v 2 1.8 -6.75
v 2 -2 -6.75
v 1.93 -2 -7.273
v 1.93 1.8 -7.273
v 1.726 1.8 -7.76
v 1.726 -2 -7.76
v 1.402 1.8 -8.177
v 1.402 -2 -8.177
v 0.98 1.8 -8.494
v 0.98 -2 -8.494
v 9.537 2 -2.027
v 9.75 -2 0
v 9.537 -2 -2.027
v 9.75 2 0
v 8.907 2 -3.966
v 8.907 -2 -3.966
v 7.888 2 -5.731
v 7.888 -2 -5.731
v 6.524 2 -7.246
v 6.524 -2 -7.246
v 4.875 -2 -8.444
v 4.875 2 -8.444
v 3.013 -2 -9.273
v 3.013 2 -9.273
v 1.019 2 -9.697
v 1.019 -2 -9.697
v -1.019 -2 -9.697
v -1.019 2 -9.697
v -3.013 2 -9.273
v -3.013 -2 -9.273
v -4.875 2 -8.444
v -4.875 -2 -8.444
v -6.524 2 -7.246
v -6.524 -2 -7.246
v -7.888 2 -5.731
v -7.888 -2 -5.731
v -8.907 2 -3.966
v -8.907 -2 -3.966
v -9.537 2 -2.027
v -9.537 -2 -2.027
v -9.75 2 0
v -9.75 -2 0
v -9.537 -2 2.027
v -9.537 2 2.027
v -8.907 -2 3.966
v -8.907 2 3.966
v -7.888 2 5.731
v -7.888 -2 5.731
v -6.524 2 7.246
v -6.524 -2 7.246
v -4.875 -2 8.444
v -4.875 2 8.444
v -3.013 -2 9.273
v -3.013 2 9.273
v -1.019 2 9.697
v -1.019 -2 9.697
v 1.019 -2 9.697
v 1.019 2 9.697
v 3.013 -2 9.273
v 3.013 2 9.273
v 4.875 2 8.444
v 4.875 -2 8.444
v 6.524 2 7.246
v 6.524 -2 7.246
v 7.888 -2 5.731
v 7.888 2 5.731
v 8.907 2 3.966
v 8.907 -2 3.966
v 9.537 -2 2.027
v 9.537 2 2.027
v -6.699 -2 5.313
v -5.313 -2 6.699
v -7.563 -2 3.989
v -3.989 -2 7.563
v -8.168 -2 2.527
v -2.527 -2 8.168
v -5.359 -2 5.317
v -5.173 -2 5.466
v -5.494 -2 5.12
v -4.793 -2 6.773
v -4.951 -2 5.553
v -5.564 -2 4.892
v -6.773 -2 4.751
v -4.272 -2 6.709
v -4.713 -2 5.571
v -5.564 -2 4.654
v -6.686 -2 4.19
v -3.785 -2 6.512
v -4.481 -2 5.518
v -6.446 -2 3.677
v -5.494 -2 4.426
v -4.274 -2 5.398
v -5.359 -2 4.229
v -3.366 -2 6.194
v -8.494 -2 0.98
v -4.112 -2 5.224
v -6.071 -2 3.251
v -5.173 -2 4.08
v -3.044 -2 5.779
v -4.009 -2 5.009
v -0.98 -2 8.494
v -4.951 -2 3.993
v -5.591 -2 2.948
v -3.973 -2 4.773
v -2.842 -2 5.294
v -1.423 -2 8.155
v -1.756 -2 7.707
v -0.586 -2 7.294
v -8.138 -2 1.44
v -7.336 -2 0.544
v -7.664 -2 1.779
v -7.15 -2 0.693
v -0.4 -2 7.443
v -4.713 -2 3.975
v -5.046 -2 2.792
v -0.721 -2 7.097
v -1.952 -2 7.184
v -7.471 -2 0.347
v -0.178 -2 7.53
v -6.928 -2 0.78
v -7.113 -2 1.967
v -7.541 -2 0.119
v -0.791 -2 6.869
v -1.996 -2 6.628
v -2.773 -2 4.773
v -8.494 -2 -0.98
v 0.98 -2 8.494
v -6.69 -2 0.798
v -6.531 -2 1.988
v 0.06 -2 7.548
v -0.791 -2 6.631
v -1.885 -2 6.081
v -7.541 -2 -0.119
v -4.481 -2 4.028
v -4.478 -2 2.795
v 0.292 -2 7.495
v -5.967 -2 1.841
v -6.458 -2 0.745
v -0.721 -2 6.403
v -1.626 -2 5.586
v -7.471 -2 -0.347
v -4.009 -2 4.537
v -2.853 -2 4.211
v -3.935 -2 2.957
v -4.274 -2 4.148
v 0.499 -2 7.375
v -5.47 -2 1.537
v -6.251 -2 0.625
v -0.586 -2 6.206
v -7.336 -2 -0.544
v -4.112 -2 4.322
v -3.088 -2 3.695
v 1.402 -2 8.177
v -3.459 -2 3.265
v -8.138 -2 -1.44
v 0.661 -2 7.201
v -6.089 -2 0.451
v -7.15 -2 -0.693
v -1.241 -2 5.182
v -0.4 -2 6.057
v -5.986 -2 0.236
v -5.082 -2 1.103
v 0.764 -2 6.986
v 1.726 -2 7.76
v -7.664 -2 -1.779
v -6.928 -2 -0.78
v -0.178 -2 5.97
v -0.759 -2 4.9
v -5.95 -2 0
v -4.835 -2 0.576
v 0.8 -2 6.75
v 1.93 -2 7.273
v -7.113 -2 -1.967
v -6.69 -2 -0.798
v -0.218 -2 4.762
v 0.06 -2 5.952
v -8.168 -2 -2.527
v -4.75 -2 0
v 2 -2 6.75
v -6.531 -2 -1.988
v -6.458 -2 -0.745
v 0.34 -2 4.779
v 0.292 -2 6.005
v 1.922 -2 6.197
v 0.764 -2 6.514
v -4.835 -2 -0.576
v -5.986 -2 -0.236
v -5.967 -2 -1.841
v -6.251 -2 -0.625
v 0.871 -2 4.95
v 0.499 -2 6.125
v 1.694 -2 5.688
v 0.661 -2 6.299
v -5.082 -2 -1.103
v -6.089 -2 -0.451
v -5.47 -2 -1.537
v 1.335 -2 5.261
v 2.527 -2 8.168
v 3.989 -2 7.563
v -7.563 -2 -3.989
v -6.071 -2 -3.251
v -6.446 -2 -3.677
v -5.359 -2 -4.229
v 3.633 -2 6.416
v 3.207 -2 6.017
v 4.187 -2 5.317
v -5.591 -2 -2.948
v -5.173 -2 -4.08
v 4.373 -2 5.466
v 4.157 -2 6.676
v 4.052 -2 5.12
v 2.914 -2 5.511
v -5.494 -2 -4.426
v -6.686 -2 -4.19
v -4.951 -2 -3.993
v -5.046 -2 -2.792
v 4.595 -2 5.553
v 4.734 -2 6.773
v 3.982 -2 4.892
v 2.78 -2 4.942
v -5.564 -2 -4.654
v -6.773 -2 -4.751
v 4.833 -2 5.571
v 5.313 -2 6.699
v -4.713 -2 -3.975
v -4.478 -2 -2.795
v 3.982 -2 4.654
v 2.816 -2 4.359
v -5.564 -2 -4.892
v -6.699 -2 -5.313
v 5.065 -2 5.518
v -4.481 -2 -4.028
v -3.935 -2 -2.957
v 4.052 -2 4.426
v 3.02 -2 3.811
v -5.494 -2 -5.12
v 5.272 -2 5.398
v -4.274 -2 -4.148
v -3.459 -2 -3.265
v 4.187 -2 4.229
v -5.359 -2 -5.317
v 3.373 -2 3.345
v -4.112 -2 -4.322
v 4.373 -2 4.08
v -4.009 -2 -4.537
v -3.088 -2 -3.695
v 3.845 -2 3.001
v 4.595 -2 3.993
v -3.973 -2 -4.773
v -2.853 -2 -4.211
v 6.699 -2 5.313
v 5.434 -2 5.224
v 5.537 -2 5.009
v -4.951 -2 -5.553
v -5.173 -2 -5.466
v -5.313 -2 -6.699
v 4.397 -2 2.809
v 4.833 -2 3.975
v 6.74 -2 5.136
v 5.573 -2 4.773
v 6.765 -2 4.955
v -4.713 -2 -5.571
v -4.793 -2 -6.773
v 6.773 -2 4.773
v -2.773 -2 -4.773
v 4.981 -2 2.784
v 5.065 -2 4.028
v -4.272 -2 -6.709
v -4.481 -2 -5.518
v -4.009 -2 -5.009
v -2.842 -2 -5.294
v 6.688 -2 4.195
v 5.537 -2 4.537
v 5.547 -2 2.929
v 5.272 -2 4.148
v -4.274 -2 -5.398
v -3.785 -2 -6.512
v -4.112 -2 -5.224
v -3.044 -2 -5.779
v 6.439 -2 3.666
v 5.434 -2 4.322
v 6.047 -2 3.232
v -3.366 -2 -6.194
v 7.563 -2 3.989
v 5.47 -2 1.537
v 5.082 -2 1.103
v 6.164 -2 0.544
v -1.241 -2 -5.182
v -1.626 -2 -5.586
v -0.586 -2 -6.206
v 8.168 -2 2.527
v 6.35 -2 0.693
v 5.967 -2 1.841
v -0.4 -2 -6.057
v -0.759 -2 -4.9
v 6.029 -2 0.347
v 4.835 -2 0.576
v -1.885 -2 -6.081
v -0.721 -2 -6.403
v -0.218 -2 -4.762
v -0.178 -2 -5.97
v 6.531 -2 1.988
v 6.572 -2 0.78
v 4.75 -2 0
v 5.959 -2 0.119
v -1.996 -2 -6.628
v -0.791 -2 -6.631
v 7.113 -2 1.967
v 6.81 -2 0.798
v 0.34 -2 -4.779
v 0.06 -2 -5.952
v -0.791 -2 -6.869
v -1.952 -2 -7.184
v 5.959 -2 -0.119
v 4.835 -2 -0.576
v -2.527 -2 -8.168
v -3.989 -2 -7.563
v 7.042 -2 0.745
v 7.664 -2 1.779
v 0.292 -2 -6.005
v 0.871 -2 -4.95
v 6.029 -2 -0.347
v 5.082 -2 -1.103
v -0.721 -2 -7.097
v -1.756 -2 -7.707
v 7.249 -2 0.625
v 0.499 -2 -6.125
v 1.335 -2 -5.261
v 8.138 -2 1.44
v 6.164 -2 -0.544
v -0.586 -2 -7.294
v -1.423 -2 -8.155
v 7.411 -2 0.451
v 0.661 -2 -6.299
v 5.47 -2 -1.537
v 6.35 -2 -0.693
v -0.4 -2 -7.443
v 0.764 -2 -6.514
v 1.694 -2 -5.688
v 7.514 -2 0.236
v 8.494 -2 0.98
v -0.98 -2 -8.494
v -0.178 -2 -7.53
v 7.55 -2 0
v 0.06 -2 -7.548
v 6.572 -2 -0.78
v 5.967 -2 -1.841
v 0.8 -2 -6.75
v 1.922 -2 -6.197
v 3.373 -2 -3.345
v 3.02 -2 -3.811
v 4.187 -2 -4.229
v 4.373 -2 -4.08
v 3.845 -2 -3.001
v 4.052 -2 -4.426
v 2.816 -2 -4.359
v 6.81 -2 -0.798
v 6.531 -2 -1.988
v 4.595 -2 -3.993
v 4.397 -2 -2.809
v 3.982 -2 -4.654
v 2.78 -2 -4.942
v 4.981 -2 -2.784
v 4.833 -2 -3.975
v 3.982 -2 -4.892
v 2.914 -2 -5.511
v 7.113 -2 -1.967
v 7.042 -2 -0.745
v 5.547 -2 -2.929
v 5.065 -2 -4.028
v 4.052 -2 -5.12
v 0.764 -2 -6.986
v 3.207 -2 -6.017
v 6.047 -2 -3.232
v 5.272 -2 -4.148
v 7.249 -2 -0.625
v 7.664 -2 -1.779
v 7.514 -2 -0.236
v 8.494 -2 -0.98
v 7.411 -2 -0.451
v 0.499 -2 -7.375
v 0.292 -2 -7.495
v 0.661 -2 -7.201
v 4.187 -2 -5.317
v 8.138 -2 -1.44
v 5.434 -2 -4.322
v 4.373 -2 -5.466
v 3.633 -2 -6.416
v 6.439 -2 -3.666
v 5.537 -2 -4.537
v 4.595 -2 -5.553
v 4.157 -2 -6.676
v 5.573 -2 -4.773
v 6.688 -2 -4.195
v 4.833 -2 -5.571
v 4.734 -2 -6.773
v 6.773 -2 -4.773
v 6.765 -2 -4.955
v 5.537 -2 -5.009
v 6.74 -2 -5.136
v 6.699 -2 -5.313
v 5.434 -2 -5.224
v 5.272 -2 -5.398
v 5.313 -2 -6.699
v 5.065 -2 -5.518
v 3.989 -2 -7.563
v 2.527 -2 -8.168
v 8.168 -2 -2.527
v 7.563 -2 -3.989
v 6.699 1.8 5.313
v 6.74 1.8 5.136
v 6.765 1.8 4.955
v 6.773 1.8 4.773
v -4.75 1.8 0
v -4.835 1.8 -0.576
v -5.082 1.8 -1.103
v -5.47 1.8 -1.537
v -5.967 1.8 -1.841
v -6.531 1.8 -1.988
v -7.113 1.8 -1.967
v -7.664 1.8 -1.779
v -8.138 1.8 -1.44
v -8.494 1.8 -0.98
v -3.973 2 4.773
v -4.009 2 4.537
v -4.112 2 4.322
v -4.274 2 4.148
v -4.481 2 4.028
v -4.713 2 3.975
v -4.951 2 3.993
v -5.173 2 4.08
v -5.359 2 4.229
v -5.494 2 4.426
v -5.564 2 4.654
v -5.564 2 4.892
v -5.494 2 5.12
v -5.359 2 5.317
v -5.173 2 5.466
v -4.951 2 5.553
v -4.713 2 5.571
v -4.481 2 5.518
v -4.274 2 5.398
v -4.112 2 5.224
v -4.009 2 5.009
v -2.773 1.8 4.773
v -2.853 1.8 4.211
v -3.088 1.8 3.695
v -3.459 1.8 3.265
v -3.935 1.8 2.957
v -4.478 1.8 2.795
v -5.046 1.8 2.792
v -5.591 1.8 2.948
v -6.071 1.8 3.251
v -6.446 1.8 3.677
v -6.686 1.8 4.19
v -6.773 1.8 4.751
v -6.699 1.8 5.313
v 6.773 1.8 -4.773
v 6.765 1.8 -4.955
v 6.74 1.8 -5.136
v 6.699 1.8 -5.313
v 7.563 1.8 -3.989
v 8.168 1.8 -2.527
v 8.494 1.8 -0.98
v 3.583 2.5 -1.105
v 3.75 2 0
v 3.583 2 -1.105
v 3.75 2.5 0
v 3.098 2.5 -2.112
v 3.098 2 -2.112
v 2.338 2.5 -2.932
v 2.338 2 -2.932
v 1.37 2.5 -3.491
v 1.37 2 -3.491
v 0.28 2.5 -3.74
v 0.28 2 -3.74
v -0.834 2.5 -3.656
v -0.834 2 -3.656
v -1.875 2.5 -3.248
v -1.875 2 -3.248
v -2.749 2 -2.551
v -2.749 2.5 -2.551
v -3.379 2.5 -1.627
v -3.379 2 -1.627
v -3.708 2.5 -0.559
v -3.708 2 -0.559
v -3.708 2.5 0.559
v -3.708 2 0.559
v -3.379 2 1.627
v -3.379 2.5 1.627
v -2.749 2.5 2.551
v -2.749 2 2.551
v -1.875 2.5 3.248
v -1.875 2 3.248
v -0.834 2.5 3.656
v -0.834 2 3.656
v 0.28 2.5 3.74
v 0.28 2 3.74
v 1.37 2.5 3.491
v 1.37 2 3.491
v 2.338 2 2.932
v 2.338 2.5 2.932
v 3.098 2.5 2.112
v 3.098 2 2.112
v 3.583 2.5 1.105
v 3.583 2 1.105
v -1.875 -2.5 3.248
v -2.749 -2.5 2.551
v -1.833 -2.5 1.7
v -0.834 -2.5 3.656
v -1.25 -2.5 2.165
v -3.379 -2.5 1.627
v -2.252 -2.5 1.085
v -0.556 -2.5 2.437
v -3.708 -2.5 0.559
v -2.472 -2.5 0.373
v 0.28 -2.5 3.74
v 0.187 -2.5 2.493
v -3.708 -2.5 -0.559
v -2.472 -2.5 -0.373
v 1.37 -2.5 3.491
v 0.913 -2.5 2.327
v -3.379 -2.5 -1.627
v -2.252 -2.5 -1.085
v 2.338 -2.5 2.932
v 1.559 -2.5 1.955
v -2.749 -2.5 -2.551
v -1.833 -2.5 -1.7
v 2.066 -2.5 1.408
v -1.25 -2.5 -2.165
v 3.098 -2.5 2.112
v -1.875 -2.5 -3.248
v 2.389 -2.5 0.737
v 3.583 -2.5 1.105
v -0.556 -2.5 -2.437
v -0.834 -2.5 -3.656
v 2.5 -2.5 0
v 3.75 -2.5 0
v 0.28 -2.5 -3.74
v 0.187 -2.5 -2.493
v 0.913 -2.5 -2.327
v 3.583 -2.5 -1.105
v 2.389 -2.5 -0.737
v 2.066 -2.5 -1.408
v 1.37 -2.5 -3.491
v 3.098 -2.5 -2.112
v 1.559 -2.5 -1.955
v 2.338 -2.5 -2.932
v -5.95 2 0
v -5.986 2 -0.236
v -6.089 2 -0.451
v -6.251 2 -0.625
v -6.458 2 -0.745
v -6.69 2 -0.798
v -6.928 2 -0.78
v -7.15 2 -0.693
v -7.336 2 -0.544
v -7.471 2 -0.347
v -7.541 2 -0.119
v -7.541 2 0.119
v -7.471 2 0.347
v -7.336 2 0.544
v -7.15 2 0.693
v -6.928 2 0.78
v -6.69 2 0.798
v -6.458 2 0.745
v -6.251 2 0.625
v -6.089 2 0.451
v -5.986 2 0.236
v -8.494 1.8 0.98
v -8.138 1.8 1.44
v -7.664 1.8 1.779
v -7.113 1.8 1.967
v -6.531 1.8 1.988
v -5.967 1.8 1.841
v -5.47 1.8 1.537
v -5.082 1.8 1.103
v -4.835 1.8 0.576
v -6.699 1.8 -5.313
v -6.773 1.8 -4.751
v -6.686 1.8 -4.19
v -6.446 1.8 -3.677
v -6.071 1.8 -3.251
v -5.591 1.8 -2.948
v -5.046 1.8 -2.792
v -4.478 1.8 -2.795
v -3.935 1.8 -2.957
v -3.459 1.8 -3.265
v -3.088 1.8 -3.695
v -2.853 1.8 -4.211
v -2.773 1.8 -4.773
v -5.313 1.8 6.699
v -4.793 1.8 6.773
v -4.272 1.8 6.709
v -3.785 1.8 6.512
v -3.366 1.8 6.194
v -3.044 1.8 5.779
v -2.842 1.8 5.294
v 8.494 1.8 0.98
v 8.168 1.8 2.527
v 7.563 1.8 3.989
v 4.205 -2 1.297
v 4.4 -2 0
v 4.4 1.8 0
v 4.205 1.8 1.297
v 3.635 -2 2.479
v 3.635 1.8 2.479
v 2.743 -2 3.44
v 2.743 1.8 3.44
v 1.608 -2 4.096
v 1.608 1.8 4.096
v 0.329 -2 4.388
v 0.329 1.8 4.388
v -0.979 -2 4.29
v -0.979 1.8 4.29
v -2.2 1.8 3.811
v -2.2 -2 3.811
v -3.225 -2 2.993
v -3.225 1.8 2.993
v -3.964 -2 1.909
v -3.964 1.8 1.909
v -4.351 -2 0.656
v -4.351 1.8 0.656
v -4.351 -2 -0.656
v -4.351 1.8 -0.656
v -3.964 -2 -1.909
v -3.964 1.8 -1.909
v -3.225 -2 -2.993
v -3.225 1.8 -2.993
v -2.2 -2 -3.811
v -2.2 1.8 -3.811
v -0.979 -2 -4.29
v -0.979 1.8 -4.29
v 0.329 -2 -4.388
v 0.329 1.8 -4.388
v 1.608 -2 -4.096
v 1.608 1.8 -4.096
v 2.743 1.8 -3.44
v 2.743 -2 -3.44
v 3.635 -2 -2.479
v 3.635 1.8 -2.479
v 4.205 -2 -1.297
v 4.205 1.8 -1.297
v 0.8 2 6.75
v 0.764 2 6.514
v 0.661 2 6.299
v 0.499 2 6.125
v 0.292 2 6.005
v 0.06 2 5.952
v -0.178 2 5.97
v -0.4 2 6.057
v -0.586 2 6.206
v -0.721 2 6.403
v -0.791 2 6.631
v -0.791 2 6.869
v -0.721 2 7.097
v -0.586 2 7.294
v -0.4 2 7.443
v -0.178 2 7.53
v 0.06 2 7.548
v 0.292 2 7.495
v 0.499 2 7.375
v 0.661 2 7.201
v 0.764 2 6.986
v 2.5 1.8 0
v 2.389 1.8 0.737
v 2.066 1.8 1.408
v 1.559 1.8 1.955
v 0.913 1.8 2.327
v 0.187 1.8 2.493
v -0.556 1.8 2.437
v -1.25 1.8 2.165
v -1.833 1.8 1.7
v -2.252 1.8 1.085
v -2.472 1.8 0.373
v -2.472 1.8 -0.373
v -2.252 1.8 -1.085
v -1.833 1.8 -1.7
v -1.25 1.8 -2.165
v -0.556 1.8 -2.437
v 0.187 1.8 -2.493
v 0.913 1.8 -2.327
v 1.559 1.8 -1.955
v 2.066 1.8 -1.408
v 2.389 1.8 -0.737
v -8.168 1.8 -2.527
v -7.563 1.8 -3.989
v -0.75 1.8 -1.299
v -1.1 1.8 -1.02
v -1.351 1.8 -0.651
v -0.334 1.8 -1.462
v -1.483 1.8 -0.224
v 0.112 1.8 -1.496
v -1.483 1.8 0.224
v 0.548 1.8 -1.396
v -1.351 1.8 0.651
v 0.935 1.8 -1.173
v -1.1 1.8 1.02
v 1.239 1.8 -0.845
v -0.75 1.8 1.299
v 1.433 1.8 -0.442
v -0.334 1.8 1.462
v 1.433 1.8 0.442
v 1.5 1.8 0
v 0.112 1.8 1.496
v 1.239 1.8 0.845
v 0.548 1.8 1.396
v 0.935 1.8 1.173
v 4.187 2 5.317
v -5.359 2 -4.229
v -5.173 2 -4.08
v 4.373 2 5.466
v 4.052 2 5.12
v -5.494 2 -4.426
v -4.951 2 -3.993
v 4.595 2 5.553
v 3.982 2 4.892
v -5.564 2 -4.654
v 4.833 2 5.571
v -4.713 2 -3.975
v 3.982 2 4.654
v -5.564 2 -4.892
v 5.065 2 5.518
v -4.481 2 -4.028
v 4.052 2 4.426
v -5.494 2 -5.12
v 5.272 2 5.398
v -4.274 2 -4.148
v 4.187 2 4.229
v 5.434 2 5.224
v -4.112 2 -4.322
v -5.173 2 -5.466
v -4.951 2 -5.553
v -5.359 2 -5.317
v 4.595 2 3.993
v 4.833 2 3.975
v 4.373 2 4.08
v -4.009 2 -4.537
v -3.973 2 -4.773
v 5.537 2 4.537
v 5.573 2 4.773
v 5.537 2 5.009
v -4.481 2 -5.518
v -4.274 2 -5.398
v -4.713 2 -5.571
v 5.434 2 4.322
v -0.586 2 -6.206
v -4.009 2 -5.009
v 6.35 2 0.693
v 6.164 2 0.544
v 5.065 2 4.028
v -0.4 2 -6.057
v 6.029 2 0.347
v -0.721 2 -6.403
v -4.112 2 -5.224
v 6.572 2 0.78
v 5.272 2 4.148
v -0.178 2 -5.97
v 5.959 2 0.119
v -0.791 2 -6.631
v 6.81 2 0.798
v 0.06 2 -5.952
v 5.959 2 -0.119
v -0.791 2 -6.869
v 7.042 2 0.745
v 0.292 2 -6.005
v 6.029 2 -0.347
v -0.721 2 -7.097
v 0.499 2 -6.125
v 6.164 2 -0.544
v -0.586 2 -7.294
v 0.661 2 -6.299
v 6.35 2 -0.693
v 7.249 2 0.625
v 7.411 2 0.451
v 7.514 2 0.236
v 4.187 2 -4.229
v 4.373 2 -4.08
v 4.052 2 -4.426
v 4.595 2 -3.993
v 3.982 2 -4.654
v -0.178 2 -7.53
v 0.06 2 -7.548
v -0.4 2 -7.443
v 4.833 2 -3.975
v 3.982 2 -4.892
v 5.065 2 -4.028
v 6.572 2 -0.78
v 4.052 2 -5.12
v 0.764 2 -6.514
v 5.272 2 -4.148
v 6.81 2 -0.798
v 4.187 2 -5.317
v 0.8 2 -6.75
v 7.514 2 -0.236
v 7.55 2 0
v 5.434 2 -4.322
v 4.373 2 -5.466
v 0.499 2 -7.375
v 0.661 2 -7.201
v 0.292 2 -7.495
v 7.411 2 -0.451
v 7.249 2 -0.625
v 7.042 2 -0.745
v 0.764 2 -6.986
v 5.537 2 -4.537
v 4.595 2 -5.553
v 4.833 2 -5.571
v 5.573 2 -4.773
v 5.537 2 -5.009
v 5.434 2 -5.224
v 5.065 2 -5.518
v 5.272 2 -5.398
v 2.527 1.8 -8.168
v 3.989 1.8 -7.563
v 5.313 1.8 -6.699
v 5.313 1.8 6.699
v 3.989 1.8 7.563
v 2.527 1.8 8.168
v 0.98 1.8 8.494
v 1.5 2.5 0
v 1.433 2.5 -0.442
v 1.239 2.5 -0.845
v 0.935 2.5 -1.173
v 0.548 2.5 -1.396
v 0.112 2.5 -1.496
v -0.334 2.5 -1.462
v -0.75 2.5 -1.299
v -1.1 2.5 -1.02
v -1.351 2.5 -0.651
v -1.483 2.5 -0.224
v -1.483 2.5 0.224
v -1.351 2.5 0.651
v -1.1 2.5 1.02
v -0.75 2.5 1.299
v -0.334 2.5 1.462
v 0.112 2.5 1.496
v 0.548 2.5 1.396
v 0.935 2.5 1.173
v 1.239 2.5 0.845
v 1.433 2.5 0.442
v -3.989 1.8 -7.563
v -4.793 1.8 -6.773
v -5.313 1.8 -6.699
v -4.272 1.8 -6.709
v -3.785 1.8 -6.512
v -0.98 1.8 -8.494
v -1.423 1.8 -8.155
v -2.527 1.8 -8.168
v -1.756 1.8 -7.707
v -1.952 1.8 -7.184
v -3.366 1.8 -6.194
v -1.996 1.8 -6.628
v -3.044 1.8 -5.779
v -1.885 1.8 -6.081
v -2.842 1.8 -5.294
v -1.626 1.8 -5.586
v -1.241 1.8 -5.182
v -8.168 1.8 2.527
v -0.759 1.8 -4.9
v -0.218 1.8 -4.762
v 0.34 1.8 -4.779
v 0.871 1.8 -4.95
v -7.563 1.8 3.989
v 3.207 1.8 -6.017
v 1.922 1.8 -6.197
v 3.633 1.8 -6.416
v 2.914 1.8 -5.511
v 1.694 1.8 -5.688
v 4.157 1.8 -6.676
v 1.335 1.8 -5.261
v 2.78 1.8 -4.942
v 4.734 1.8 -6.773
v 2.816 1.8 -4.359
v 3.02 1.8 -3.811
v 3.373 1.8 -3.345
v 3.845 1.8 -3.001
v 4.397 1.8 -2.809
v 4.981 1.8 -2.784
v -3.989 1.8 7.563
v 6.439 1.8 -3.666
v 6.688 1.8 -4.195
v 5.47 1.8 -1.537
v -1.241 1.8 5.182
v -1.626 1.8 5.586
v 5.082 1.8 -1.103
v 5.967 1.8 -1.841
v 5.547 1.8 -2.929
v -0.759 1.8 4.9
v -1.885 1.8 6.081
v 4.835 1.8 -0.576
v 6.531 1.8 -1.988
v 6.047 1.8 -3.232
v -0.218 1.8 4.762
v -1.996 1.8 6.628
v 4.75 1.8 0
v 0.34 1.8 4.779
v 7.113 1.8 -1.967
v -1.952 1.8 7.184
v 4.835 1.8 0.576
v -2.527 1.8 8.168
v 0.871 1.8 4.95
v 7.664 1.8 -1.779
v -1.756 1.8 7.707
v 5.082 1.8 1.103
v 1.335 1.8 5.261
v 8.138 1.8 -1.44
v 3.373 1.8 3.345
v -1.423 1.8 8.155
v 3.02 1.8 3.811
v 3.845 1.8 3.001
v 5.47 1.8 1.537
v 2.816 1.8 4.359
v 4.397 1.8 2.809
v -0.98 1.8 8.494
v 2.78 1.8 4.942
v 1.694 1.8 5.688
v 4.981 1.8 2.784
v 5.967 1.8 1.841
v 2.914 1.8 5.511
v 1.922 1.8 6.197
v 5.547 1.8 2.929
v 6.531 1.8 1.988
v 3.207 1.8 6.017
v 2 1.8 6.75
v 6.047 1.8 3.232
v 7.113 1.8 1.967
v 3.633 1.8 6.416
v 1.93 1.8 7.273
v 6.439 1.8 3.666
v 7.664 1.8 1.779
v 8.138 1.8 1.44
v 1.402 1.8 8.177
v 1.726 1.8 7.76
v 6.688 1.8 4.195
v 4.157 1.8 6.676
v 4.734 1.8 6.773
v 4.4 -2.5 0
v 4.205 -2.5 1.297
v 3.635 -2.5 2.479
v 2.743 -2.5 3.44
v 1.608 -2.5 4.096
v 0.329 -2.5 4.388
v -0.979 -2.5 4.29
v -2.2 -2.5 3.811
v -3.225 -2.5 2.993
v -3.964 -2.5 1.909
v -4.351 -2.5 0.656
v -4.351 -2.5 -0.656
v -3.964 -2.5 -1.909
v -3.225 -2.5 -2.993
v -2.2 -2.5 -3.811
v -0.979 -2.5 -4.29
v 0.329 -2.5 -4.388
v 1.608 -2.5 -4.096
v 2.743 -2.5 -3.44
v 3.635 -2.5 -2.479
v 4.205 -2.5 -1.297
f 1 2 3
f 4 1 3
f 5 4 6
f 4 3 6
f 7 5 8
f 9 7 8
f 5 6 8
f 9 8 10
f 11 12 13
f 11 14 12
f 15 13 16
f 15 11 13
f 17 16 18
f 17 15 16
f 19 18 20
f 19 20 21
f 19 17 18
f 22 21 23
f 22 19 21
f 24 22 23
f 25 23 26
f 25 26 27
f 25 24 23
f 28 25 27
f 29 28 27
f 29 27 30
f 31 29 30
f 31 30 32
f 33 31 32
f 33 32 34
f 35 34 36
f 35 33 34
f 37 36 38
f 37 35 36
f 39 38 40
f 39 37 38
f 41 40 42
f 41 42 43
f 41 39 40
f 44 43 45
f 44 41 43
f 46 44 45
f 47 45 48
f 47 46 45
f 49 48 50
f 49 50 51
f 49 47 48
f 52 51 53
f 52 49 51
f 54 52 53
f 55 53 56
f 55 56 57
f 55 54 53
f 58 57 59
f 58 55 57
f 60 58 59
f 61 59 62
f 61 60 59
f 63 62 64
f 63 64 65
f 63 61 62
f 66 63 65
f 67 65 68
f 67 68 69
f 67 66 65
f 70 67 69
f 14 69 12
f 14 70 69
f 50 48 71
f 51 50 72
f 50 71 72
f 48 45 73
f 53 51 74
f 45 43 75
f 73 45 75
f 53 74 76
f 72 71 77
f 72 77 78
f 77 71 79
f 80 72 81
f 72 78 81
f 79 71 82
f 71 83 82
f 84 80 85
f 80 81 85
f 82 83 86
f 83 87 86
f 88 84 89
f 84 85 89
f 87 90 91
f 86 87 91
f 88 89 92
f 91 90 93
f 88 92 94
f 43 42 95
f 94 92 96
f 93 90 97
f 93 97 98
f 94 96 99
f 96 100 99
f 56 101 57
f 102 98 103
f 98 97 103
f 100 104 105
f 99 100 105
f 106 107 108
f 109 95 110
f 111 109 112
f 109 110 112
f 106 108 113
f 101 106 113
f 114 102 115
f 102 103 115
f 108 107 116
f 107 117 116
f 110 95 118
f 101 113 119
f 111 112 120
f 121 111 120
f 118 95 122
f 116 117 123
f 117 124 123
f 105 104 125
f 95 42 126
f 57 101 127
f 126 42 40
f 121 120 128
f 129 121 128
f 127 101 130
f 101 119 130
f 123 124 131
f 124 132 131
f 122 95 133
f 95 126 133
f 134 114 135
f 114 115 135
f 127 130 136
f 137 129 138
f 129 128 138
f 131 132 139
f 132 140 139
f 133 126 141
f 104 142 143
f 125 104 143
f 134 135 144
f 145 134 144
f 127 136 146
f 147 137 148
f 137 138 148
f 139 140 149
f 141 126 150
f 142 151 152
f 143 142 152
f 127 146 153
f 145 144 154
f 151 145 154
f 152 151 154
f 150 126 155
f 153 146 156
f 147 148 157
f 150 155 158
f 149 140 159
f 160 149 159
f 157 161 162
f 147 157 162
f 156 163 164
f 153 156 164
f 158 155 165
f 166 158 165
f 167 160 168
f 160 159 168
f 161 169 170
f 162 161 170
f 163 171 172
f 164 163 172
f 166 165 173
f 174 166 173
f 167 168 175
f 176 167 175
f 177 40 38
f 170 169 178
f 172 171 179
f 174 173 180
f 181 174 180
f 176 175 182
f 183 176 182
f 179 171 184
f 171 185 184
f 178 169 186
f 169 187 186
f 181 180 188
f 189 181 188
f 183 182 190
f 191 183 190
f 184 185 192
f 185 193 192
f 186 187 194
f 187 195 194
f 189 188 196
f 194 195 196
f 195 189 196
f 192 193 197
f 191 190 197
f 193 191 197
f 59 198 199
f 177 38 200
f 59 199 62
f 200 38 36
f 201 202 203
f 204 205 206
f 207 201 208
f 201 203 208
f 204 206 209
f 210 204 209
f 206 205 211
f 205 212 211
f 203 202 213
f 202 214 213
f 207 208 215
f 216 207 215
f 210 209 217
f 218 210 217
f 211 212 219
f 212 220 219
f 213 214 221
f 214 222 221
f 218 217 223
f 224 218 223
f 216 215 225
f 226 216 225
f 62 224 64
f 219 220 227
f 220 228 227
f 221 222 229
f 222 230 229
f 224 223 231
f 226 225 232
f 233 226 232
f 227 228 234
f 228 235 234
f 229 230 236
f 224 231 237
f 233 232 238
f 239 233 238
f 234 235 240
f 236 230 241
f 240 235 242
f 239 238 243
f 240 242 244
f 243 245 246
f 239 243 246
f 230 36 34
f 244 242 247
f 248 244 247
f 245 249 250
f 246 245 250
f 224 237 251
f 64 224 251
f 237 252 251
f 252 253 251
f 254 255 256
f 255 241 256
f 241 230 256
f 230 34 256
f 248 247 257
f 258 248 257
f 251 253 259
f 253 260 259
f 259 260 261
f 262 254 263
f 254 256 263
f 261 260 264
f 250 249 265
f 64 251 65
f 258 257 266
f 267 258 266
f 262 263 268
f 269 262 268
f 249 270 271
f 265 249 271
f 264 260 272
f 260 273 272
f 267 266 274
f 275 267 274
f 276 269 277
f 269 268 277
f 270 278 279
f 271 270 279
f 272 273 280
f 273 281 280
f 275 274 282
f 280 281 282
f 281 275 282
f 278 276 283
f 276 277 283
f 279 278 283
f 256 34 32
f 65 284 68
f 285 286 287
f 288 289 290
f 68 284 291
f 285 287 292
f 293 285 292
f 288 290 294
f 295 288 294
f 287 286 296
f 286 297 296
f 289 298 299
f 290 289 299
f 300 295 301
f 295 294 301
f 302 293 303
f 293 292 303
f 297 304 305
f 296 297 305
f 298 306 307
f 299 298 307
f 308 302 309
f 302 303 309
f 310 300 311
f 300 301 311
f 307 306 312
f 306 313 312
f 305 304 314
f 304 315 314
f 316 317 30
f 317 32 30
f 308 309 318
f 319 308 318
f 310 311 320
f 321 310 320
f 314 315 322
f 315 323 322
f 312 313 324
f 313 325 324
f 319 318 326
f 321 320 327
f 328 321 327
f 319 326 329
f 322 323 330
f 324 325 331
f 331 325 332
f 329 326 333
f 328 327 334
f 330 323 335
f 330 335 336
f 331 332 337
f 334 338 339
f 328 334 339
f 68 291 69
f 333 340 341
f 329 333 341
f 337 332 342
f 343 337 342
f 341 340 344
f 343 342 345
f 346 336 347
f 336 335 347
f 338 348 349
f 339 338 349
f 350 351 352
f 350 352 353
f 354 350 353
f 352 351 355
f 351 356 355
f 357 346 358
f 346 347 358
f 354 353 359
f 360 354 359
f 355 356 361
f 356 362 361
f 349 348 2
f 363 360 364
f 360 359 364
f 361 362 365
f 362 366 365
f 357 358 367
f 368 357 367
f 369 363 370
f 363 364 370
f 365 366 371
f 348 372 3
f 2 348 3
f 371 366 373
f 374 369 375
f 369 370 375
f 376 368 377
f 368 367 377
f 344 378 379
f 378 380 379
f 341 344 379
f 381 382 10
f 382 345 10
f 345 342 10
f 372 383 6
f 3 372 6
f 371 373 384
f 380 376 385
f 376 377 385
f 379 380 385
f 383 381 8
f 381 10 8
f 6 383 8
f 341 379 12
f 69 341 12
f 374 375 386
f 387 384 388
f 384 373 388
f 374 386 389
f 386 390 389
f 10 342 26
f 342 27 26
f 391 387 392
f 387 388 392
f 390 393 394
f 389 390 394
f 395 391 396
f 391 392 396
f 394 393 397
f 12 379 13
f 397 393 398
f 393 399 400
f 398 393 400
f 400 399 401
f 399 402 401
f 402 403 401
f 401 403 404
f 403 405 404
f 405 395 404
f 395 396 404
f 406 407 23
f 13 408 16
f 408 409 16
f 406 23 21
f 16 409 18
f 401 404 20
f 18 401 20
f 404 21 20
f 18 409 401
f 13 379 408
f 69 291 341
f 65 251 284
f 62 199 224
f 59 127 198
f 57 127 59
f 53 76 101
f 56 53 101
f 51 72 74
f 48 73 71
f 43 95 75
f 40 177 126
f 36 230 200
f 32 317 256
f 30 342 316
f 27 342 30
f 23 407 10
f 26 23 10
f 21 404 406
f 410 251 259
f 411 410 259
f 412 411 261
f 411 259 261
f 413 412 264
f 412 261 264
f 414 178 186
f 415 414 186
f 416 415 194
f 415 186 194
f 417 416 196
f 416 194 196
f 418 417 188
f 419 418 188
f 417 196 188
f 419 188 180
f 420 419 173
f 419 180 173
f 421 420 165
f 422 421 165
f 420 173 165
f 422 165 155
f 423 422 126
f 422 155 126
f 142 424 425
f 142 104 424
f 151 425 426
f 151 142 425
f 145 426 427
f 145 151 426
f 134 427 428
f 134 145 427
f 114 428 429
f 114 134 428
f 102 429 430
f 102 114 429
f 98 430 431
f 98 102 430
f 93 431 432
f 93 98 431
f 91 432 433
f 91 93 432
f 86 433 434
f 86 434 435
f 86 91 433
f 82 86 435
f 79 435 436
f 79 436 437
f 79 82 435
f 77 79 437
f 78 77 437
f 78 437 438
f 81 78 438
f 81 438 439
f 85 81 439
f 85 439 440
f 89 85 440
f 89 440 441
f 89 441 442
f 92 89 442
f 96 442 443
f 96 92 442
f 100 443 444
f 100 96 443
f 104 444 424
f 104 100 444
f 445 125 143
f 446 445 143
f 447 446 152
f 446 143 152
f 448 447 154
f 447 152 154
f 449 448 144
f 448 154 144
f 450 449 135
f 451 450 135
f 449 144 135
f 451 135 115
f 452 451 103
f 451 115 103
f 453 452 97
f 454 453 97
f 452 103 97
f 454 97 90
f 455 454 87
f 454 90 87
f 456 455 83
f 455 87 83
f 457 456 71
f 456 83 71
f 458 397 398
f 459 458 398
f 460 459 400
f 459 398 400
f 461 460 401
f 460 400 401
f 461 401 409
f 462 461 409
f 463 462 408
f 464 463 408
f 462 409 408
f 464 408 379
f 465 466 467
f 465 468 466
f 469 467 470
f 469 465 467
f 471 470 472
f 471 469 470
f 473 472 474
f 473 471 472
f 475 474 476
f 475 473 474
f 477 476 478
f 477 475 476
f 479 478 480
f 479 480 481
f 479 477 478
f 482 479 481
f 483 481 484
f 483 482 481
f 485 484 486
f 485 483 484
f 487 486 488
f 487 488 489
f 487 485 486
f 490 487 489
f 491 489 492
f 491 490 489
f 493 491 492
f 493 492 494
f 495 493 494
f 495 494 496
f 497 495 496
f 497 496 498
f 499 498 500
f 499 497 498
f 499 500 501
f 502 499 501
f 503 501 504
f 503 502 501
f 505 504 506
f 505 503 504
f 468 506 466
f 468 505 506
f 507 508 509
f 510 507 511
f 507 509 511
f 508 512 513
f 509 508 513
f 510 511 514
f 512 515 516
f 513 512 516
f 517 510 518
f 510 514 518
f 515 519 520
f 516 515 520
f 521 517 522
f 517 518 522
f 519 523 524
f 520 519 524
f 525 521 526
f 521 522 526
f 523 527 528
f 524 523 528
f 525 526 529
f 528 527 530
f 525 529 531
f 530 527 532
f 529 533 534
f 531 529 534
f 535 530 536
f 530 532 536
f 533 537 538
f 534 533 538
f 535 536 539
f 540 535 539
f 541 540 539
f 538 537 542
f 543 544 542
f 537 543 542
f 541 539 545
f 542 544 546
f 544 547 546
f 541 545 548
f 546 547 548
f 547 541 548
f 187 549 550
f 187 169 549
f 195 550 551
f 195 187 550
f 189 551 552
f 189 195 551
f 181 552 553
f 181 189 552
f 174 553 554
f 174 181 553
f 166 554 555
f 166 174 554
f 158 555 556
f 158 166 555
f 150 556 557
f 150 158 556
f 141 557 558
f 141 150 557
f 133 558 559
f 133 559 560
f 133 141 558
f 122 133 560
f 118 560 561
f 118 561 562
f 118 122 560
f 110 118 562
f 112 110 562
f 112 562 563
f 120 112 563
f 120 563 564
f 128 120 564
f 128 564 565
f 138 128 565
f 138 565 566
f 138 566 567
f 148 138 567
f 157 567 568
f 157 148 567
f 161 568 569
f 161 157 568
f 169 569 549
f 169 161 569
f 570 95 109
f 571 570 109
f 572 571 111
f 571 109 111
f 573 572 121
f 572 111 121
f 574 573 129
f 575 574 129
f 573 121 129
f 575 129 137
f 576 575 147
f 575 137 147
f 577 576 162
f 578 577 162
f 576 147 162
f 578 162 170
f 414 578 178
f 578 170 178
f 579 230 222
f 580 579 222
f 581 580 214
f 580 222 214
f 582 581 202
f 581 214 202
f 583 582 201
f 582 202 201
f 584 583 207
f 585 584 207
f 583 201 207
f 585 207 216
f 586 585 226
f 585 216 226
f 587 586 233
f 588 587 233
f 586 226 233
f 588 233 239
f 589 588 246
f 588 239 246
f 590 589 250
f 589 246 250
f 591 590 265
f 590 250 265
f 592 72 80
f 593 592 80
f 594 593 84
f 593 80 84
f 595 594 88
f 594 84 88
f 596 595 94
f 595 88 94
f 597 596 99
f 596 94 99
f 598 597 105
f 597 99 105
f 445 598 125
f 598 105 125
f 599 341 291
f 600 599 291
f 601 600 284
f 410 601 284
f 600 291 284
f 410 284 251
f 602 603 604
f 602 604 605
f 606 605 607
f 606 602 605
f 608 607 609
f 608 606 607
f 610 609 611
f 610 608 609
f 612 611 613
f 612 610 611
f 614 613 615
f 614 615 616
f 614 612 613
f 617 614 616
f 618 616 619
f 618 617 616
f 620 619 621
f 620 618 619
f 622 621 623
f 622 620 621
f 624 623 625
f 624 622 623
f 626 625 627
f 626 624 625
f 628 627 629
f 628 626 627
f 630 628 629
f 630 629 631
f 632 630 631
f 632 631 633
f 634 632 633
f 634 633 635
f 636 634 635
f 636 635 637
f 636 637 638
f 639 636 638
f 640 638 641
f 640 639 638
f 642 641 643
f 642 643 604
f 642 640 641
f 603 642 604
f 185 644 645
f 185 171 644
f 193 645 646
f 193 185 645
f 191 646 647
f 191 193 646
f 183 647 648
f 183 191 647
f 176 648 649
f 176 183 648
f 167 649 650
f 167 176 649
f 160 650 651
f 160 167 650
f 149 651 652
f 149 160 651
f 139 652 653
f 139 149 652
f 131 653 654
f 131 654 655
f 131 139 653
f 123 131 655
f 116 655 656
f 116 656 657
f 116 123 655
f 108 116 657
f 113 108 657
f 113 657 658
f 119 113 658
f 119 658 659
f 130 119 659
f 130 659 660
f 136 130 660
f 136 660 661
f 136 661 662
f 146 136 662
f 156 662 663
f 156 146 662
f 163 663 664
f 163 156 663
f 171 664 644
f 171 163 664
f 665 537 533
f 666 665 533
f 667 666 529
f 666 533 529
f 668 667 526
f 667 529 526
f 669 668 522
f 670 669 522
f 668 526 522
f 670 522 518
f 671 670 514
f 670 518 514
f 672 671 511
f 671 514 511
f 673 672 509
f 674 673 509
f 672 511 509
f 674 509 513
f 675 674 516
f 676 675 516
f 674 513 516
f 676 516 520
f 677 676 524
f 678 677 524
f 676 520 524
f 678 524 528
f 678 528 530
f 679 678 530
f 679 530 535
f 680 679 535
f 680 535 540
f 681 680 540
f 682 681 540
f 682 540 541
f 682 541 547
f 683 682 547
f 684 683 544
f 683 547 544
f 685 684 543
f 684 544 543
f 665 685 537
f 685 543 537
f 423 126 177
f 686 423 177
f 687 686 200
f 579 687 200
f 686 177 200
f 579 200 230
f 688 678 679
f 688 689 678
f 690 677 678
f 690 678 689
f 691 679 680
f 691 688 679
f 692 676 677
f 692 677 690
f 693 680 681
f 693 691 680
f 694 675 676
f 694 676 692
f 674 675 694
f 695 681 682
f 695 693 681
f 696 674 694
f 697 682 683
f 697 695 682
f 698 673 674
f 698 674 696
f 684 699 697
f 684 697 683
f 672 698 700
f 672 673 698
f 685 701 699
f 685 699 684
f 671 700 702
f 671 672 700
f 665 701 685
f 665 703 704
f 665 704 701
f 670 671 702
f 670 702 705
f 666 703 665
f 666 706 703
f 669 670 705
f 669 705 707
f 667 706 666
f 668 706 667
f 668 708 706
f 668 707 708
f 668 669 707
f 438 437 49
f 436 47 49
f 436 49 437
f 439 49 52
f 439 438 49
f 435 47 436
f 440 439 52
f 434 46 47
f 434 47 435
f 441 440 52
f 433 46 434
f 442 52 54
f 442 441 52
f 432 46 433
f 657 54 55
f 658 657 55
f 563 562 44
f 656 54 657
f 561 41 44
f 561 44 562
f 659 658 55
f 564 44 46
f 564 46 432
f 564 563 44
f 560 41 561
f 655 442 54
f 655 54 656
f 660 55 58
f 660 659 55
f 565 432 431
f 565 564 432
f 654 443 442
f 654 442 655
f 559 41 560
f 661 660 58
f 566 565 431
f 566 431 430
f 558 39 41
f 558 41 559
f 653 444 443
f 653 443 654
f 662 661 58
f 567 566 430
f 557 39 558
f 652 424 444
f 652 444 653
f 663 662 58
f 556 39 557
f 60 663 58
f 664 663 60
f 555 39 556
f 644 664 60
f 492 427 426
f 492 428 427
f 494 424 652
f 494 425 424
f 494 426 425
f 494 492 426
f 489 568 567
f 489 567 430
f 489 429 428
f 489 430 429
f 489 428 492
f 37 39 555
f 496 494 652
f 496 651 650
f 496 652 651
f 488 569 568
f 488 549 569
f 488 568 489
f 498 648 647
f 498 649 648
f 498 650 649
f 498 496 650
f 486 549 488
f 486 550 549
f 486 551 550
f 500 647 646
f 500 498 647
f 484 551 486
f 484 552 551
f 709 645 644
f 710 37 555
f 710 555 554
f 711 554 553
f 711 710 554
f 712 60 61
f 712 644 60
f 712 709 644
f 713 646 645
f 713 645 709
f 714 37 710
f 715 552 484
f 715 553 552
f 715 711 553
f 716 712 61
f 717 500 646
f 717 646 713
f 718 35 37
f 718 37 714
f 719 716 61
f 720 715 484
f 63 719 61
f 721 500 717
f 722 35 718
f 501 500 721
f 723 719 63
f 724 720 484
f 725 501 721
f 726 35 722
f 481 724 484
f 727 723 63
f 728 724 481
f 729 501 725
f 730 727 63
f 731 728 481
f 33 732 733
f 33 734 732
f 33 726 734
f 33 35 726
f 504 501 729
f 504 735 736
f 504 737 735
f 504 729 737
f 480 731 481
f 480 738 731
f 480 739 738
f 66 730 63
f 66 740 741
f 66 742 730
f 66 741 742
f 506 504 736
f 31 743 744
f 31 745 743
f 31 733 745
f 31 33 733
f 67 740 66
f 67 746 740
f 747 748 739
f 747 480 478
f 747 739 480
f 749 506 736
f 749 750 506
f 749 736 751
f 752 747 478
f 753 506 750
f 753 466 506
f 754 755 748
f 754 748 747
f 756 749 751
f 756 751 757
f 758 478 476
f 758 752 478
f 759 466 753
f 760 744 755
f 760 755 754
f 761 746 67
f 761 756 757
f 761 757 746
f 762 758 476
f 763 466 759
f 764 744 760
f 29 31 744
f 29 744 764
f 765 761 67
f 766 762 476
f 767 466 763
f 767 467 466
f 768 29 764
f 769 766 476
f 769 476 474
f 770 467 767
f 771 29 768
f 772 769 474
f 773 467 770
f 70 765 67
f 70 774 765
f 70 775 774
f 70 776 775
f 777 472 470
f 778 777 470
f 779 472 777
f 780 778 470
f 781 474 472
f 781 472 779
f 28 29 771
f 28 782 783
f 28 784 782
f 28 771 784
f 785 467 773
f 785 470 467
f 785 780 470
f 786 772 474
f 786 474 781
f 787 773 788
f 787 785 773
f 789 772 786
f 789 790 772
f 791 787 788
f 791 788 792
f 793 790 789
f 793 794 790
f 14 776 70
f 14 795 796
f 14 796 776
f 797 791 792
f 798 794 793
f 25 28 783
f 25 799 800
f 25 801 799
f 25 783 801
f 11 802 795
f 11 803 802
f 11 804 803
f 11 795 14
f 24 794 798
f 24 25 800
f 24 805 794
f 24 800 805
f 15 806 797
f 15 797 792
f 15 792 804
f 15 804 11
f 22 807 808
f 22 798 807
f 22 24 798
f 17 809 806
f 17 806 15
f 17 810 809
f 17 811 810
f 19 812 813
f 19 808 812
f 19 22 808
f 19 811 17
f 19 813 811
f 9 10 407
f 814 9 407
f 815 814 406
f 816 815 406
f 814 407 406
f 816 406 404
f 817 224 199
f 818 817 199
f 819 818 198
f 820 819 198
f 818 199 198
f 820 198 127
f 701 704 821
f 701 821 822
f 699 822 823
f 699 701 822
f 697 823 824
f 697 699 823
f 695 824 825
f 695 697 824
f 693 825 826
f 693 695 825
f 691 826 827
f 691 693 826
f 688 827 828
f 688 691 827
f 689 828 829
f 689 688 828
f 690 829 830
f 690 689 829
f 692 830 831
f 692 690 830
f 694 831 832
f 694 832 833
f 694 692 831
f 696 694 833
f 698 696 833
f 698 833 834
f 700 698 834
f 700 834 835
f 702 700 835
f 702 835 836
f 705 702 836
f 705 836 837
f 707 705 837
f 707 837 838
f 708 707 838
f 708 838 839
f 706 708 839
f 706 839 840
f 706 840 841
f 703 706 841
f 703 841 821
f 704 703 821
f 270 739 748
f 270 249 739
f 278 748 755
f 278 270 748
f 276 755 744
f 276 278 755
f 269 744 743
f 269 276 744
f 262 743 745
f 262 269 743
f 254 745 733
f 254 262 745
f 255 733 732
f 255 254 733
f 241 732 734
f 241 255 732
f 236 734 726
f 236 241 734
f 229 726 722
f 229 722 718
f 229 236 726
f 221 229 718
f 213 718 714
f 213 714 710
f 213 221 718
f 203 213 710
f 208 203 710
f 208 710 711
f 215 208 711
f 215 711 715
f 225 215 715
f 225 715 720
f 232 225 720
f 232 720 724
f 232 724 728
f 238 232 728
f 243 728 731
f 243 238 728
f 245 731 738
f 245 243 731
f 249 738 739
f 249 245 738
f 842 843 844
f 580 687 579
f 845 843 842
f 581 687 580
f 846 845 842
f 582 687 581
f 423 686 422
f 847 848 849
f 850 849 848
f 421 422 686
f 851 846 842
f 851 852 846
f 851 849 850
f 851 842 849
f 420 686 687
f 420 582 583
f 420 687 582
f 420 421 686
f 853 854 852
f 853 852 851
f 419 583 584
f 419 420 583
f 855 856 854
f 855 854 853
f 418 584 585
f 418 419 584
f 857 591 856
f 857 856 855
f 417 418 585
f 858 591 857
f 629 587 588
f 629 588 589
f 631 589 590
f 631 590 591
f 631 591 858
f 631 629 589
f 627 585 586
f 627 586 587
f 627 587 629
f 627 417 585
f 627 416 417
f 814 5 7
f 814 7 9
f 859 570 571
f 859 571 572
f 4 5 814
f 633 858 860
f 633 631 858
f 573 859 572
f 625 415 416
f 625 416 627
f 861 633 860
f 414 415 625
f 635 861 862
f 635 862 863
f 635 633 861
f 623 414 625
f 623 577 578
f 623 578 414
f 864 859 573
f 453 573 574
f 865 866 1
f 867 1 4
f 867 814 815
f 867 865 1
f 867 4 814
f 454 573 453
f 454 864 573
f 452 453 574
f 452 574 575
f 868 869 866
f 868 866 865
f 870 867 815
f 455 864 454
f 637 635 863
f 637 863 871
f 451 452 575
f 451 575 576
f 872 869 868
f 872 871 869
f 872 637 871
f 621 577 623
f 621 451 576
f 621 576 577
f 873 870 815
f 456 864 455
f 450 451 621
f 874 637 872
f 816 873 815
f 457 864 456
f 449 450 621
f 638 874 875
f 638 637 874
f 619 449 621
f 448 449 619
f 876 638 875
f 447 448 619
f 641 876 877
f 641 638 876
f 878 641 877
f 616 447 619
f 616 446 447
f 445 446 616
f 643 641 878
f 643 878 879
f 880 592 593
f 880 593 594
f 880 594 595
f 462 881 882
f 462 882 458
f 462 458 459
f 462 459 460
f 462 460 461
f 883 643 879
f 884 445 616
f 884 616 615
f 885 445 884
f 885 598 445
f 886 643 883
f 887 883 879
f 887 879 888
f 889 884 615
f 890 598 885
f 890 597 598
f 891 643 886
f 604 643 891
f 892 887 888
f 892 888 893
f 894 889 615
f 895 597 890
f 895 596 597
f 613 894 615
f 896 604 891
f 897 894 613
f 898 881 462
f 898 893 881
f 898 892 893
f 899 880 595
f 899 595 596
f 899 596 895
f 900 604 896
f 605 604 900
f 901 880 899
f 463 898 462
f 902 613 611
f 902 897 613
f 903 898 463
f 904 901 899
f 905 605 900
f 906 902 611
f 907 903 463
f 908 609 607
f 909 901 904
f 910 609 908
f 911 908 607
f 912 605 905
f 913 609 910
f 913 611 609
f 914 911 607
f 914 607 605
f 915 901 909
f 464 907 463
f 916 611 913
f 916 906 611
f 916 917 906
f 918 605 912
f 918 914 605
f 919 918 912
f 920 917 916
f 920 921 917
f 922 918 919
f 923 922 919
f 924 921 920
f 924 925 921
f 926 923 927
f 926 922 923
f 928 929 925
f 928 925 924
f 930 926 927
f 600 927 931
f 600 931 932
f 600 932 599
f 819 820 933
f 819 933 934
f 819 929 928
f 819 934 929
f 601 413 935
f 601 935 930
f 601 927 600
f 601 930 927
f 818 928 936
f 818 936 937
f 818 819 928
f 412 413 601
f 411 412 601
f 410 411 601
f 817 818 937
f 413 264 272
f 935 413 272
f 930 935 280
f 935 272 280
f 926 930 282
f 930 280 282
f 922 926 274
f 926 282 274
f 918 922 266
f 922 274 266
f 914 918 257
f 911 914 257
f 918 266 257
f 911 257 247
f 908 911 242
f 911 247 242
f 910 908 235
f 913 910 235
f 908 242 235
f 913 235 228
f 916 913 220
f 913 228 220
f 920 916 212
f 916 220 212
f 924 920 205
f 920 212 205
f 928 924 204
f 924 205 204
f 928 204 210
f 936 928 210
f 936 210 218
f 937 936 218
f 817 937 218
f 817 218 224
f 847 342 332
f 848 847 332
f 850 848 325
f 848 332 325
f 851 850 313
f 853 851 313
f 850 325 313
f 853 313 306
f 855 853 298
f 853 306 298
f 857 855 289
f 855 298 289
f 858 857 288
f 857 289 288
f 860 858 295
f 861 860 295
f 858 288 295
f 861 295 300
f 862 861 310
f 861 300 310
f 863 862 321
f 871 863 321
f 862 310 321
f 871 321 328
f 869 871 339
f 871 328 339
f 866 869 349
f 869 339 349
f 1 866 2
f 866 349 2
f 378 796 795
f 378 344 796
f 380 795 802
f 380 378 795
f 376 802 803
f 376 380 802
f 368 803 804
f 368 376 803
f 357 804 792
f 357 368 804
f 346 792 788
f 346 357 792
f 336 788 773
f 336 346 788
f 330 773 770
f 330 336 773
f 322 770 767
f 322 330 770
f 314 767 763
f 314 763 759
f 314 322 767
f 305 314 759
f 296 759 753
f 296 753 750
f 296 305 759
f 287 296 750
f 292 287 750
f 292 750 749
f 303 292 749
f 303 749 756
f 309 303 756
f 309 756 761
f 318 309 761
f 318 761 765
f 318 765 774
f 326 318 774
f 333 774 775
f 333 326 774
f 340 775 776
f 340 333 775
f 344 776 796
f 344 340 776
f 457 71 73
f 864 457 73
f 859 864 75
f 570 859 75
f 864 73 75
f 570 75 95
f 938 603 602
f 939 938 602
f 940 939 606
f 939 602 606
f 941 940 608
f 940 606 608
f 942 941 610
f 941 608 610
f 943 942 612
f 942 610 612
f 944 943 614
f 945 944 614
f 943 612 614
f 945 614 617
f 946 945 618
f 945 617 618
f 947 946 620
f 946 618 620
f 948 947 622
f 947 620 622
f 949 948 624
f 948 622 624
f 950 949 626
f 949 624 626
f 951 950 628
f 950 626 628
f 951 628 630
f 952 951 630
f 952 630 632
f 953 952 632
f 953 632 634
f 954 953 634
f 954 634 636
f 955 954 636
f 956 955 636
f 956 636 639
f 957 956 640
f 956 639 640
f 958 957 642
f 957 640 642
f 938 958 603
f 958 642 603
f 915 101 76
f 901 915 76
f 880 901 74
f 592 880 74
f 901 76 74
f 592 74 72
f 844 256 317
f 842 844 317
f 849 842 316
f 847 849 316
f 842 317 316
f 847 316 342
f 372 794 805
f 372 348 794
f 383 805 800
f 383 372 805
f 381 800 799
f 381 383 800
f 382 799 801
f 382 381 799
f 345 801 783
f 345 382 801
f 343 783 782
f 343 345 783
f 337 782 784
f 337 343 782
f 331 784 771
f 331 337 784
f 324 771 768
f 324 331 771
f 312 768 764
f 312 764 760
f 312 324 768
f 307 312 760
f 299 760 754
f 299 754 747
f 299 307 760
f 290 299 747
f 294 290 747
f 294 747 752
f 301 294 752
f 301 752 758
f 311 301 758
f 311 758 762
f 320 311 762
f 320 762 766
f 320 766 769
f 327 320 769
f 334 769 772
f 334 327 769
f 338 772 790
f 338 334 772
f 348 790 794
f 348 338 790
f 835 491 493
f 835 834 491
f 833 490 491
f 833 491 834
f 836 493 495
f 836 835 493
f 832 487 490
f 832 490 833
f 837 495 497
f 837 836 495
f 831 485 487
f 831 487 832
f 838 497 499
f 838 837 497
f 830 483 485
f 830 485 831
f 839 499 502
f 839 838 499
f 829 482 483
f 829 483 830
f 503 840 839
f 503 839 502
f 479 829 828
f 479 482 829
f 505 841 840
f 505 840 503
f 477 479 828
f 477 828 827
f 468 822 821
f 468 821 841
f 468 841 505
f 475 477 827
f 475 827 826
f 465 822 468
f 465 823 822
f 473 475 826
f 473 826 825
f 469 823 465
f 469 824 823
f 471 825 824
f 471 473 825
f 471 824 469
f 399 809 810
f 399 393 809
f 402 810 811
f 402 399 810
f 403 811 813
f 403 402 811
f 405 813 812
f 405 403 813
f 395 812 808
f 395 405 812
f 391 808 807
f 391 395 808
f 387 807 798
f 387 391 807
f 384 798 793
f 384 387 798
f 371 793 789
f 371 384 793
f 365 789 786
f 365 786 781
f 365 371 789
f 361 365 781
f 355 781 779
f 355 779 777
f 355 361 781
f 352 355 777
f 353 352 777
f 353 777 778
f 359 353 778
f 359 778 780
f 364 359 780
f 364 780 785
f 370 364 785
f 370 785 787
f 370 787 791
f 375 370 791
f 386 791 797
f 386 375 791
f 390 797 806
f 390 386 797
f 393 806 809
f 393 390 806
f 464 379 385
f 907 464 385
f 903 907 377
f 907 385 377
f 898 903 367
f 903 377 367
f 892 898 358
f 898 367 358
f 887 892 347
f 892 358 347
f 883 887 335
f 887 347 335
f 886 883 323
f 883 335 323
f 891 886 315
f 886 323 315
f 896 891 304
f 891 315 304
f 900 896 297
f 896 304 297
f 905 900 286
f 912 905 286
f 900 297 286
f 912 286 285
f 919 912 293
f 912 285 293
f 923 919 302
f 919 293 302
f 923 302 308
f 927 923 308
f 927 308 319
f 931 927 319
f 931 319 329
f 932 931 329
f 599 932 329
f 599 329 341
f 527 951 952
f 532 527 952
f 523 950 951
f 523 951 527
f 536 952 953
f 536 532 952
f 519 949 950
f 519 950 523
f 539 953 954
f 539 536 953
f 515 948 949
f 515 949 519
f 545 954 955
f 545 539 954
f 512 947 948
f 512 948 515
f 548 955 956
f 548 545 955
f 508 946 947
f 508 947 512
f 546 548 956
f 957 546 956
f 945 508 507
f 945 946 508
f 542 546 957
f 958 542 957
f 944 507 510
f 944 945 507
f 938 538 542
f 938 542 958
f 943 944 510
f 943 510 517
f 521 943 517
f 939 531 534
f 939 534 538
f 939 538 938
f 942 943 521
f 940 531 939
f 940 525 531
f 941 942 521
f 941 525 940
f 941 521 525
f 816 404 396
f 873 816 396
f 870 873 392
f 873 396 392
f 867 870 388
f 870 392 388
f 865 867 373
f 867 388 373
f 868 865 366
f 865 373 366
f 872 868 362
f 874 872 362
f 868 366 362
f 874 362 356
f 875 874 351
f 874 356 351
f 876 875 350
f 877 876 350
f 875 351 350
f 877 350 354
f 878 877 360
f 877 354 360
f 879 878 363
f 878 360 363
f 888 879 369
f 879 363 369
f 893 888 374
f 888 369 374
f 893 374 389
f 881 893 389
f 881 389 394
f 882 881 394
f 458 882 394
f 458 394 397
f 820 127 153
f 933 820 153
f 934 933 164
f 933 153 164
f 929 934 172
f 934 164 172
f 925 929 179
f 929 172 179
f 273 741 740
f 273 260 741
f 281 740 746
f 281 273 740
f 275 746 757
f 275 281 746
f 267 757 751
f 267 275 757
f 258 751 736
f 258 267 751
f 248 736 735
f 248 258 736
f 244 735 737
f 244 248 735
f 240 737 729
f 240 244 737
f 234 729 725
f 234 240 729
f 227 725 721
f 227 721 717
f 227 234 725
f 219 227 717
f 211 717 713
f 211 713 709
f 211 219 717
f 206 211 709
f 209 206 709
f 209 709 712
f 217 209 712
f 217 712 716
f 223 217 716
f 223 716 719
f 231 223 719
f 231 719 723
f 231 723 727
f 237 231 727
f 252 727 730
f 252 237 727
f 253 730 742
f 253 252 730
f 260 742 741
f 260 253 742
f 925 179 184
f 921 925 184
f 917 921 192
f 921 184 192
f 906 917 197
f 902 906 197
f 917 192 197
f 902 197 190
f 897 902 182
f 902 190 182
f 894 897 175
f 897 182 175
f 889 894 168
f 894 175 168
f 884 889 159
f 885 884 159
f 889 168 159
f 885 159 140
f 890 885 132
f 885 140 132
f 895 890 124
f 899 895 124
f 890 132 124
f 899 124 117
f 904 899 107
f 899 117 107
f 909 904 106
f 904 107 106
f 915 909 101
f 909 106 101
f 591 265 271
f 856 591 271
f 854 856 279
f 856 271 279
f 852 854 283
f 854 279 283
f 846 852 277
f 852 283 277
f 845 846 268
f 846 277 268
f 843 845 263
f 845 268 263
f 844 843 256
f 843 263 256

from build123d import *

# Parameters (mm, degrees)
CROQUIS1_R              = 9.75
CROQUIS1_R_2            = 0.8
CROQUIS1_R_3            = 1.5
SALIENTE_EXTRUIR1_DEPTH = 2
CROQUIS1_3_R            = 3.75
CROQUIS1_3_R_2          = 1.5
SALIENTE_EXTRUIR2_DEPTH = 2.5
CROQUIS2_R              = 4.4
CORTAR_EXTRUIR3_DEPTH   = 3.8
CROQUIS2_6_R            = 4.4
CROQUIS2_6_R_2          = 3.75
SALIENTE_EXTRUIR3_DEPTH = 0.5
CROQUIS2_9_R            = 2.5
CORTAR_EXTRUIR4_DEPTH   = 3.8


with BuildPart() as part:
    # Croquis1 → Saliente-Extruir1 (new, symmetric)
    with BuildSketch(Plane(origin=(0, 0, 0), x_dir=(1, 0, 0), z_dir=(0, 1, 0))):
        Circle(CROQUIS1_R)
        with Locations((-4.772970773, -4.772970773)):
            Circle(CROQUIS1_R_2, mode=Mode.SUBTRACT)
        with Locations((0, -6.75)):
            Circle(CROQUIS1_R_2, mode=Mode.SUBTRACT)
        with Locations((4.772970773, -4.772970773)):
            Circle(CROQUIS1_R_2, mode=Mode.SUBTRACT)
        with Locations((-6.75, 0)):
            Circle(CROQUIS1_R_2, mode=Mode.SUBTRACT)
        with Locations((-4.772970773, 4.772970773)):
            Circle(CROQUIS1_R_2, mode=Mode.SUBTRACT)
        with Locations((4.772970773, 4.772970773)):
            Circle(CROQUIS1_R_2, mode=Mode.SUBTRACT)
        with Locations((6.75, 0)):
            Circle(CROQUIS1_R_2, mode=Mode.SUBTRACT)
        with Locations((0, 6.75)):
            Circle(CROQUIS1_R_2, mode=Mode.SUBTRACT)
        Circle(CROQUIS1_R_3, mode=Mode.SUBTRACT)
    extrude(amount=SALIENTE_EXTRUIR1_DEPTH, both=True)

    # Croquis1_3 → Saliente-Extruir2 (add, symmetric)
    with BuildSketch(Plane(origin=(0, 0, 0), x_dir=(1, 0, 0), z_dir=(0, 1, 0))):
        Circle(CROQUIS1_3_R)
        Circle(CROQUIS1_3_R_2, mode=Mode.SUBTRACT)
    extrude(amount=SALIENTE_EXTRUIR2_DEPTH, both=True)

    # Croquis2 → Cortar-Extruir3 (cut)
    with BuildSketch(Plane.XZ.offset(2)):
        with BuildLine():
            ThreePointArc((8.493703704, -0.979539378), (4.75, 0), (8.493703704, 0.979539378))
            ThreePointArc((8.493703704, 0.979539378), (7.899170003, 3.271943347), (6.698594423, 5.313316549))
            ThreePointArc((6.698594423, 5.313316549), (6.754289437, 5.045691051), (6.772970773, 4.772970773))
            ThreePointArc((6.772970773, 4.772970773), (3.179124552, 3.564809267), (5.313316549, 6.698594423))
            ThreePointArc((5.313316549, 6.698594423), (3.271943347, 7.899170003), (0.979539378, 8.493703704))
            ThreePointArc((0.979539378, 8.493703704), (1.72613423, 7.76017851), (2, 6.75))
            ThreePointArc((2, 6.75), (-1.01017851, 5.02386577), (-0.979539378, 8.493703704))
            ThreePointArc((-0.979539378, 8.493703704), (-3.271943347, 7.899170003), (-5.313316549, 6.698594423))
            ThreePointArc((-5.313316549, 6.698594423), (-3.564809267, 6.366816994), (-2.772970773, 4.772970773))
            ThreePointArc((-2.772970773, 4.772970773), (-5.045691051, 2.791652109), (-6.698594423, 5.313316549))
            ThreePointArc((-6.698594423, 5.313316549), (-7.899170003, 3.271943347), (-8.493703704, 0.979539378))
            ThreePointArc((-8.493703704, 0.979539378), (-6.243742856, 1.934865293), (-4.75, 0))
            ThreePointArc((-4.75, 0), (-6.243742856, -1.934865293), (-8.493703704, -0.979539378))
            ThreePointArc((-8.493703704, -0.979539378), (-7.899170003, -3.271943347), (-6.698594423, -5.313316549))
            ThreePointArc((-6.698594423, -5.313316549), (-5.045691051, -2.791652109), (-2.772970773, -4.772970773))
            ThreePointArc((-2.772970773, -4.772970773), (-3.564809267, -6.366816994), (-5.313316549, -6.698594423))
            ThreePointArc((-5.313316549, -6.698594423), (-3.271943347, -7.899170003), (-0.979539378, -8.493703704))
            ThreePointArc((-0.979539378, -8.493703704), (-1.01017851, -5.02386577), (2, -6.75))
            ThreePointArc((2, -6.75), (1.72613423, -7.76017851), (0.979539378, -8.493703704))
            ThreePointArc((0.979539378, -8.493703704), (3.271943347, -7.899170003), (5.313316549, -6.698594423))
            ThreePointArc((5.313316549, -6.698594423), (3.179124552, -3.564809267), (6.772970773, -4.772970773))
            ThreePointArc((6.772970773, -4.772970773), (6.754289437, -5.045691051), (6.698594423, -5.313316549))
            ThreePointArc((6.698594423, -5.313316549), (7.899170003, -3.271943347), (8.493703704, -0.979539378))
        make_face()
        Circle(CROQUIS2_R, mode=Mode.SUBTRACT)
    extrude(amount=-CORTAR_EXTRUIR3_DEPTH, mode=Mode.SUBTRACT)

    # Croquis2_6 → Saliente-Extruir3 (add)
    with BuildSketch(Plane.XZ.offset(2)):
        Circle(CROQUIS2_6_R)
        Circle(CROQUIS2_6_R_2, mode=Mode.SUBTRACT)
    extrude(amount=SALIENTE_EXTRUIR3_DEPTH)

    # Croquis2_9 → Cortar-Extruir4 (cut, symmetric)
    with BuildSketch(Plane.XZ.offset(2)):
        Circle(CROQUIS2_9_R)
    extrude(amount=CORTAR_EXTRUIR4_DEPTH, both=True, mode=Mode.SUBTRACT)


solid = part.part
